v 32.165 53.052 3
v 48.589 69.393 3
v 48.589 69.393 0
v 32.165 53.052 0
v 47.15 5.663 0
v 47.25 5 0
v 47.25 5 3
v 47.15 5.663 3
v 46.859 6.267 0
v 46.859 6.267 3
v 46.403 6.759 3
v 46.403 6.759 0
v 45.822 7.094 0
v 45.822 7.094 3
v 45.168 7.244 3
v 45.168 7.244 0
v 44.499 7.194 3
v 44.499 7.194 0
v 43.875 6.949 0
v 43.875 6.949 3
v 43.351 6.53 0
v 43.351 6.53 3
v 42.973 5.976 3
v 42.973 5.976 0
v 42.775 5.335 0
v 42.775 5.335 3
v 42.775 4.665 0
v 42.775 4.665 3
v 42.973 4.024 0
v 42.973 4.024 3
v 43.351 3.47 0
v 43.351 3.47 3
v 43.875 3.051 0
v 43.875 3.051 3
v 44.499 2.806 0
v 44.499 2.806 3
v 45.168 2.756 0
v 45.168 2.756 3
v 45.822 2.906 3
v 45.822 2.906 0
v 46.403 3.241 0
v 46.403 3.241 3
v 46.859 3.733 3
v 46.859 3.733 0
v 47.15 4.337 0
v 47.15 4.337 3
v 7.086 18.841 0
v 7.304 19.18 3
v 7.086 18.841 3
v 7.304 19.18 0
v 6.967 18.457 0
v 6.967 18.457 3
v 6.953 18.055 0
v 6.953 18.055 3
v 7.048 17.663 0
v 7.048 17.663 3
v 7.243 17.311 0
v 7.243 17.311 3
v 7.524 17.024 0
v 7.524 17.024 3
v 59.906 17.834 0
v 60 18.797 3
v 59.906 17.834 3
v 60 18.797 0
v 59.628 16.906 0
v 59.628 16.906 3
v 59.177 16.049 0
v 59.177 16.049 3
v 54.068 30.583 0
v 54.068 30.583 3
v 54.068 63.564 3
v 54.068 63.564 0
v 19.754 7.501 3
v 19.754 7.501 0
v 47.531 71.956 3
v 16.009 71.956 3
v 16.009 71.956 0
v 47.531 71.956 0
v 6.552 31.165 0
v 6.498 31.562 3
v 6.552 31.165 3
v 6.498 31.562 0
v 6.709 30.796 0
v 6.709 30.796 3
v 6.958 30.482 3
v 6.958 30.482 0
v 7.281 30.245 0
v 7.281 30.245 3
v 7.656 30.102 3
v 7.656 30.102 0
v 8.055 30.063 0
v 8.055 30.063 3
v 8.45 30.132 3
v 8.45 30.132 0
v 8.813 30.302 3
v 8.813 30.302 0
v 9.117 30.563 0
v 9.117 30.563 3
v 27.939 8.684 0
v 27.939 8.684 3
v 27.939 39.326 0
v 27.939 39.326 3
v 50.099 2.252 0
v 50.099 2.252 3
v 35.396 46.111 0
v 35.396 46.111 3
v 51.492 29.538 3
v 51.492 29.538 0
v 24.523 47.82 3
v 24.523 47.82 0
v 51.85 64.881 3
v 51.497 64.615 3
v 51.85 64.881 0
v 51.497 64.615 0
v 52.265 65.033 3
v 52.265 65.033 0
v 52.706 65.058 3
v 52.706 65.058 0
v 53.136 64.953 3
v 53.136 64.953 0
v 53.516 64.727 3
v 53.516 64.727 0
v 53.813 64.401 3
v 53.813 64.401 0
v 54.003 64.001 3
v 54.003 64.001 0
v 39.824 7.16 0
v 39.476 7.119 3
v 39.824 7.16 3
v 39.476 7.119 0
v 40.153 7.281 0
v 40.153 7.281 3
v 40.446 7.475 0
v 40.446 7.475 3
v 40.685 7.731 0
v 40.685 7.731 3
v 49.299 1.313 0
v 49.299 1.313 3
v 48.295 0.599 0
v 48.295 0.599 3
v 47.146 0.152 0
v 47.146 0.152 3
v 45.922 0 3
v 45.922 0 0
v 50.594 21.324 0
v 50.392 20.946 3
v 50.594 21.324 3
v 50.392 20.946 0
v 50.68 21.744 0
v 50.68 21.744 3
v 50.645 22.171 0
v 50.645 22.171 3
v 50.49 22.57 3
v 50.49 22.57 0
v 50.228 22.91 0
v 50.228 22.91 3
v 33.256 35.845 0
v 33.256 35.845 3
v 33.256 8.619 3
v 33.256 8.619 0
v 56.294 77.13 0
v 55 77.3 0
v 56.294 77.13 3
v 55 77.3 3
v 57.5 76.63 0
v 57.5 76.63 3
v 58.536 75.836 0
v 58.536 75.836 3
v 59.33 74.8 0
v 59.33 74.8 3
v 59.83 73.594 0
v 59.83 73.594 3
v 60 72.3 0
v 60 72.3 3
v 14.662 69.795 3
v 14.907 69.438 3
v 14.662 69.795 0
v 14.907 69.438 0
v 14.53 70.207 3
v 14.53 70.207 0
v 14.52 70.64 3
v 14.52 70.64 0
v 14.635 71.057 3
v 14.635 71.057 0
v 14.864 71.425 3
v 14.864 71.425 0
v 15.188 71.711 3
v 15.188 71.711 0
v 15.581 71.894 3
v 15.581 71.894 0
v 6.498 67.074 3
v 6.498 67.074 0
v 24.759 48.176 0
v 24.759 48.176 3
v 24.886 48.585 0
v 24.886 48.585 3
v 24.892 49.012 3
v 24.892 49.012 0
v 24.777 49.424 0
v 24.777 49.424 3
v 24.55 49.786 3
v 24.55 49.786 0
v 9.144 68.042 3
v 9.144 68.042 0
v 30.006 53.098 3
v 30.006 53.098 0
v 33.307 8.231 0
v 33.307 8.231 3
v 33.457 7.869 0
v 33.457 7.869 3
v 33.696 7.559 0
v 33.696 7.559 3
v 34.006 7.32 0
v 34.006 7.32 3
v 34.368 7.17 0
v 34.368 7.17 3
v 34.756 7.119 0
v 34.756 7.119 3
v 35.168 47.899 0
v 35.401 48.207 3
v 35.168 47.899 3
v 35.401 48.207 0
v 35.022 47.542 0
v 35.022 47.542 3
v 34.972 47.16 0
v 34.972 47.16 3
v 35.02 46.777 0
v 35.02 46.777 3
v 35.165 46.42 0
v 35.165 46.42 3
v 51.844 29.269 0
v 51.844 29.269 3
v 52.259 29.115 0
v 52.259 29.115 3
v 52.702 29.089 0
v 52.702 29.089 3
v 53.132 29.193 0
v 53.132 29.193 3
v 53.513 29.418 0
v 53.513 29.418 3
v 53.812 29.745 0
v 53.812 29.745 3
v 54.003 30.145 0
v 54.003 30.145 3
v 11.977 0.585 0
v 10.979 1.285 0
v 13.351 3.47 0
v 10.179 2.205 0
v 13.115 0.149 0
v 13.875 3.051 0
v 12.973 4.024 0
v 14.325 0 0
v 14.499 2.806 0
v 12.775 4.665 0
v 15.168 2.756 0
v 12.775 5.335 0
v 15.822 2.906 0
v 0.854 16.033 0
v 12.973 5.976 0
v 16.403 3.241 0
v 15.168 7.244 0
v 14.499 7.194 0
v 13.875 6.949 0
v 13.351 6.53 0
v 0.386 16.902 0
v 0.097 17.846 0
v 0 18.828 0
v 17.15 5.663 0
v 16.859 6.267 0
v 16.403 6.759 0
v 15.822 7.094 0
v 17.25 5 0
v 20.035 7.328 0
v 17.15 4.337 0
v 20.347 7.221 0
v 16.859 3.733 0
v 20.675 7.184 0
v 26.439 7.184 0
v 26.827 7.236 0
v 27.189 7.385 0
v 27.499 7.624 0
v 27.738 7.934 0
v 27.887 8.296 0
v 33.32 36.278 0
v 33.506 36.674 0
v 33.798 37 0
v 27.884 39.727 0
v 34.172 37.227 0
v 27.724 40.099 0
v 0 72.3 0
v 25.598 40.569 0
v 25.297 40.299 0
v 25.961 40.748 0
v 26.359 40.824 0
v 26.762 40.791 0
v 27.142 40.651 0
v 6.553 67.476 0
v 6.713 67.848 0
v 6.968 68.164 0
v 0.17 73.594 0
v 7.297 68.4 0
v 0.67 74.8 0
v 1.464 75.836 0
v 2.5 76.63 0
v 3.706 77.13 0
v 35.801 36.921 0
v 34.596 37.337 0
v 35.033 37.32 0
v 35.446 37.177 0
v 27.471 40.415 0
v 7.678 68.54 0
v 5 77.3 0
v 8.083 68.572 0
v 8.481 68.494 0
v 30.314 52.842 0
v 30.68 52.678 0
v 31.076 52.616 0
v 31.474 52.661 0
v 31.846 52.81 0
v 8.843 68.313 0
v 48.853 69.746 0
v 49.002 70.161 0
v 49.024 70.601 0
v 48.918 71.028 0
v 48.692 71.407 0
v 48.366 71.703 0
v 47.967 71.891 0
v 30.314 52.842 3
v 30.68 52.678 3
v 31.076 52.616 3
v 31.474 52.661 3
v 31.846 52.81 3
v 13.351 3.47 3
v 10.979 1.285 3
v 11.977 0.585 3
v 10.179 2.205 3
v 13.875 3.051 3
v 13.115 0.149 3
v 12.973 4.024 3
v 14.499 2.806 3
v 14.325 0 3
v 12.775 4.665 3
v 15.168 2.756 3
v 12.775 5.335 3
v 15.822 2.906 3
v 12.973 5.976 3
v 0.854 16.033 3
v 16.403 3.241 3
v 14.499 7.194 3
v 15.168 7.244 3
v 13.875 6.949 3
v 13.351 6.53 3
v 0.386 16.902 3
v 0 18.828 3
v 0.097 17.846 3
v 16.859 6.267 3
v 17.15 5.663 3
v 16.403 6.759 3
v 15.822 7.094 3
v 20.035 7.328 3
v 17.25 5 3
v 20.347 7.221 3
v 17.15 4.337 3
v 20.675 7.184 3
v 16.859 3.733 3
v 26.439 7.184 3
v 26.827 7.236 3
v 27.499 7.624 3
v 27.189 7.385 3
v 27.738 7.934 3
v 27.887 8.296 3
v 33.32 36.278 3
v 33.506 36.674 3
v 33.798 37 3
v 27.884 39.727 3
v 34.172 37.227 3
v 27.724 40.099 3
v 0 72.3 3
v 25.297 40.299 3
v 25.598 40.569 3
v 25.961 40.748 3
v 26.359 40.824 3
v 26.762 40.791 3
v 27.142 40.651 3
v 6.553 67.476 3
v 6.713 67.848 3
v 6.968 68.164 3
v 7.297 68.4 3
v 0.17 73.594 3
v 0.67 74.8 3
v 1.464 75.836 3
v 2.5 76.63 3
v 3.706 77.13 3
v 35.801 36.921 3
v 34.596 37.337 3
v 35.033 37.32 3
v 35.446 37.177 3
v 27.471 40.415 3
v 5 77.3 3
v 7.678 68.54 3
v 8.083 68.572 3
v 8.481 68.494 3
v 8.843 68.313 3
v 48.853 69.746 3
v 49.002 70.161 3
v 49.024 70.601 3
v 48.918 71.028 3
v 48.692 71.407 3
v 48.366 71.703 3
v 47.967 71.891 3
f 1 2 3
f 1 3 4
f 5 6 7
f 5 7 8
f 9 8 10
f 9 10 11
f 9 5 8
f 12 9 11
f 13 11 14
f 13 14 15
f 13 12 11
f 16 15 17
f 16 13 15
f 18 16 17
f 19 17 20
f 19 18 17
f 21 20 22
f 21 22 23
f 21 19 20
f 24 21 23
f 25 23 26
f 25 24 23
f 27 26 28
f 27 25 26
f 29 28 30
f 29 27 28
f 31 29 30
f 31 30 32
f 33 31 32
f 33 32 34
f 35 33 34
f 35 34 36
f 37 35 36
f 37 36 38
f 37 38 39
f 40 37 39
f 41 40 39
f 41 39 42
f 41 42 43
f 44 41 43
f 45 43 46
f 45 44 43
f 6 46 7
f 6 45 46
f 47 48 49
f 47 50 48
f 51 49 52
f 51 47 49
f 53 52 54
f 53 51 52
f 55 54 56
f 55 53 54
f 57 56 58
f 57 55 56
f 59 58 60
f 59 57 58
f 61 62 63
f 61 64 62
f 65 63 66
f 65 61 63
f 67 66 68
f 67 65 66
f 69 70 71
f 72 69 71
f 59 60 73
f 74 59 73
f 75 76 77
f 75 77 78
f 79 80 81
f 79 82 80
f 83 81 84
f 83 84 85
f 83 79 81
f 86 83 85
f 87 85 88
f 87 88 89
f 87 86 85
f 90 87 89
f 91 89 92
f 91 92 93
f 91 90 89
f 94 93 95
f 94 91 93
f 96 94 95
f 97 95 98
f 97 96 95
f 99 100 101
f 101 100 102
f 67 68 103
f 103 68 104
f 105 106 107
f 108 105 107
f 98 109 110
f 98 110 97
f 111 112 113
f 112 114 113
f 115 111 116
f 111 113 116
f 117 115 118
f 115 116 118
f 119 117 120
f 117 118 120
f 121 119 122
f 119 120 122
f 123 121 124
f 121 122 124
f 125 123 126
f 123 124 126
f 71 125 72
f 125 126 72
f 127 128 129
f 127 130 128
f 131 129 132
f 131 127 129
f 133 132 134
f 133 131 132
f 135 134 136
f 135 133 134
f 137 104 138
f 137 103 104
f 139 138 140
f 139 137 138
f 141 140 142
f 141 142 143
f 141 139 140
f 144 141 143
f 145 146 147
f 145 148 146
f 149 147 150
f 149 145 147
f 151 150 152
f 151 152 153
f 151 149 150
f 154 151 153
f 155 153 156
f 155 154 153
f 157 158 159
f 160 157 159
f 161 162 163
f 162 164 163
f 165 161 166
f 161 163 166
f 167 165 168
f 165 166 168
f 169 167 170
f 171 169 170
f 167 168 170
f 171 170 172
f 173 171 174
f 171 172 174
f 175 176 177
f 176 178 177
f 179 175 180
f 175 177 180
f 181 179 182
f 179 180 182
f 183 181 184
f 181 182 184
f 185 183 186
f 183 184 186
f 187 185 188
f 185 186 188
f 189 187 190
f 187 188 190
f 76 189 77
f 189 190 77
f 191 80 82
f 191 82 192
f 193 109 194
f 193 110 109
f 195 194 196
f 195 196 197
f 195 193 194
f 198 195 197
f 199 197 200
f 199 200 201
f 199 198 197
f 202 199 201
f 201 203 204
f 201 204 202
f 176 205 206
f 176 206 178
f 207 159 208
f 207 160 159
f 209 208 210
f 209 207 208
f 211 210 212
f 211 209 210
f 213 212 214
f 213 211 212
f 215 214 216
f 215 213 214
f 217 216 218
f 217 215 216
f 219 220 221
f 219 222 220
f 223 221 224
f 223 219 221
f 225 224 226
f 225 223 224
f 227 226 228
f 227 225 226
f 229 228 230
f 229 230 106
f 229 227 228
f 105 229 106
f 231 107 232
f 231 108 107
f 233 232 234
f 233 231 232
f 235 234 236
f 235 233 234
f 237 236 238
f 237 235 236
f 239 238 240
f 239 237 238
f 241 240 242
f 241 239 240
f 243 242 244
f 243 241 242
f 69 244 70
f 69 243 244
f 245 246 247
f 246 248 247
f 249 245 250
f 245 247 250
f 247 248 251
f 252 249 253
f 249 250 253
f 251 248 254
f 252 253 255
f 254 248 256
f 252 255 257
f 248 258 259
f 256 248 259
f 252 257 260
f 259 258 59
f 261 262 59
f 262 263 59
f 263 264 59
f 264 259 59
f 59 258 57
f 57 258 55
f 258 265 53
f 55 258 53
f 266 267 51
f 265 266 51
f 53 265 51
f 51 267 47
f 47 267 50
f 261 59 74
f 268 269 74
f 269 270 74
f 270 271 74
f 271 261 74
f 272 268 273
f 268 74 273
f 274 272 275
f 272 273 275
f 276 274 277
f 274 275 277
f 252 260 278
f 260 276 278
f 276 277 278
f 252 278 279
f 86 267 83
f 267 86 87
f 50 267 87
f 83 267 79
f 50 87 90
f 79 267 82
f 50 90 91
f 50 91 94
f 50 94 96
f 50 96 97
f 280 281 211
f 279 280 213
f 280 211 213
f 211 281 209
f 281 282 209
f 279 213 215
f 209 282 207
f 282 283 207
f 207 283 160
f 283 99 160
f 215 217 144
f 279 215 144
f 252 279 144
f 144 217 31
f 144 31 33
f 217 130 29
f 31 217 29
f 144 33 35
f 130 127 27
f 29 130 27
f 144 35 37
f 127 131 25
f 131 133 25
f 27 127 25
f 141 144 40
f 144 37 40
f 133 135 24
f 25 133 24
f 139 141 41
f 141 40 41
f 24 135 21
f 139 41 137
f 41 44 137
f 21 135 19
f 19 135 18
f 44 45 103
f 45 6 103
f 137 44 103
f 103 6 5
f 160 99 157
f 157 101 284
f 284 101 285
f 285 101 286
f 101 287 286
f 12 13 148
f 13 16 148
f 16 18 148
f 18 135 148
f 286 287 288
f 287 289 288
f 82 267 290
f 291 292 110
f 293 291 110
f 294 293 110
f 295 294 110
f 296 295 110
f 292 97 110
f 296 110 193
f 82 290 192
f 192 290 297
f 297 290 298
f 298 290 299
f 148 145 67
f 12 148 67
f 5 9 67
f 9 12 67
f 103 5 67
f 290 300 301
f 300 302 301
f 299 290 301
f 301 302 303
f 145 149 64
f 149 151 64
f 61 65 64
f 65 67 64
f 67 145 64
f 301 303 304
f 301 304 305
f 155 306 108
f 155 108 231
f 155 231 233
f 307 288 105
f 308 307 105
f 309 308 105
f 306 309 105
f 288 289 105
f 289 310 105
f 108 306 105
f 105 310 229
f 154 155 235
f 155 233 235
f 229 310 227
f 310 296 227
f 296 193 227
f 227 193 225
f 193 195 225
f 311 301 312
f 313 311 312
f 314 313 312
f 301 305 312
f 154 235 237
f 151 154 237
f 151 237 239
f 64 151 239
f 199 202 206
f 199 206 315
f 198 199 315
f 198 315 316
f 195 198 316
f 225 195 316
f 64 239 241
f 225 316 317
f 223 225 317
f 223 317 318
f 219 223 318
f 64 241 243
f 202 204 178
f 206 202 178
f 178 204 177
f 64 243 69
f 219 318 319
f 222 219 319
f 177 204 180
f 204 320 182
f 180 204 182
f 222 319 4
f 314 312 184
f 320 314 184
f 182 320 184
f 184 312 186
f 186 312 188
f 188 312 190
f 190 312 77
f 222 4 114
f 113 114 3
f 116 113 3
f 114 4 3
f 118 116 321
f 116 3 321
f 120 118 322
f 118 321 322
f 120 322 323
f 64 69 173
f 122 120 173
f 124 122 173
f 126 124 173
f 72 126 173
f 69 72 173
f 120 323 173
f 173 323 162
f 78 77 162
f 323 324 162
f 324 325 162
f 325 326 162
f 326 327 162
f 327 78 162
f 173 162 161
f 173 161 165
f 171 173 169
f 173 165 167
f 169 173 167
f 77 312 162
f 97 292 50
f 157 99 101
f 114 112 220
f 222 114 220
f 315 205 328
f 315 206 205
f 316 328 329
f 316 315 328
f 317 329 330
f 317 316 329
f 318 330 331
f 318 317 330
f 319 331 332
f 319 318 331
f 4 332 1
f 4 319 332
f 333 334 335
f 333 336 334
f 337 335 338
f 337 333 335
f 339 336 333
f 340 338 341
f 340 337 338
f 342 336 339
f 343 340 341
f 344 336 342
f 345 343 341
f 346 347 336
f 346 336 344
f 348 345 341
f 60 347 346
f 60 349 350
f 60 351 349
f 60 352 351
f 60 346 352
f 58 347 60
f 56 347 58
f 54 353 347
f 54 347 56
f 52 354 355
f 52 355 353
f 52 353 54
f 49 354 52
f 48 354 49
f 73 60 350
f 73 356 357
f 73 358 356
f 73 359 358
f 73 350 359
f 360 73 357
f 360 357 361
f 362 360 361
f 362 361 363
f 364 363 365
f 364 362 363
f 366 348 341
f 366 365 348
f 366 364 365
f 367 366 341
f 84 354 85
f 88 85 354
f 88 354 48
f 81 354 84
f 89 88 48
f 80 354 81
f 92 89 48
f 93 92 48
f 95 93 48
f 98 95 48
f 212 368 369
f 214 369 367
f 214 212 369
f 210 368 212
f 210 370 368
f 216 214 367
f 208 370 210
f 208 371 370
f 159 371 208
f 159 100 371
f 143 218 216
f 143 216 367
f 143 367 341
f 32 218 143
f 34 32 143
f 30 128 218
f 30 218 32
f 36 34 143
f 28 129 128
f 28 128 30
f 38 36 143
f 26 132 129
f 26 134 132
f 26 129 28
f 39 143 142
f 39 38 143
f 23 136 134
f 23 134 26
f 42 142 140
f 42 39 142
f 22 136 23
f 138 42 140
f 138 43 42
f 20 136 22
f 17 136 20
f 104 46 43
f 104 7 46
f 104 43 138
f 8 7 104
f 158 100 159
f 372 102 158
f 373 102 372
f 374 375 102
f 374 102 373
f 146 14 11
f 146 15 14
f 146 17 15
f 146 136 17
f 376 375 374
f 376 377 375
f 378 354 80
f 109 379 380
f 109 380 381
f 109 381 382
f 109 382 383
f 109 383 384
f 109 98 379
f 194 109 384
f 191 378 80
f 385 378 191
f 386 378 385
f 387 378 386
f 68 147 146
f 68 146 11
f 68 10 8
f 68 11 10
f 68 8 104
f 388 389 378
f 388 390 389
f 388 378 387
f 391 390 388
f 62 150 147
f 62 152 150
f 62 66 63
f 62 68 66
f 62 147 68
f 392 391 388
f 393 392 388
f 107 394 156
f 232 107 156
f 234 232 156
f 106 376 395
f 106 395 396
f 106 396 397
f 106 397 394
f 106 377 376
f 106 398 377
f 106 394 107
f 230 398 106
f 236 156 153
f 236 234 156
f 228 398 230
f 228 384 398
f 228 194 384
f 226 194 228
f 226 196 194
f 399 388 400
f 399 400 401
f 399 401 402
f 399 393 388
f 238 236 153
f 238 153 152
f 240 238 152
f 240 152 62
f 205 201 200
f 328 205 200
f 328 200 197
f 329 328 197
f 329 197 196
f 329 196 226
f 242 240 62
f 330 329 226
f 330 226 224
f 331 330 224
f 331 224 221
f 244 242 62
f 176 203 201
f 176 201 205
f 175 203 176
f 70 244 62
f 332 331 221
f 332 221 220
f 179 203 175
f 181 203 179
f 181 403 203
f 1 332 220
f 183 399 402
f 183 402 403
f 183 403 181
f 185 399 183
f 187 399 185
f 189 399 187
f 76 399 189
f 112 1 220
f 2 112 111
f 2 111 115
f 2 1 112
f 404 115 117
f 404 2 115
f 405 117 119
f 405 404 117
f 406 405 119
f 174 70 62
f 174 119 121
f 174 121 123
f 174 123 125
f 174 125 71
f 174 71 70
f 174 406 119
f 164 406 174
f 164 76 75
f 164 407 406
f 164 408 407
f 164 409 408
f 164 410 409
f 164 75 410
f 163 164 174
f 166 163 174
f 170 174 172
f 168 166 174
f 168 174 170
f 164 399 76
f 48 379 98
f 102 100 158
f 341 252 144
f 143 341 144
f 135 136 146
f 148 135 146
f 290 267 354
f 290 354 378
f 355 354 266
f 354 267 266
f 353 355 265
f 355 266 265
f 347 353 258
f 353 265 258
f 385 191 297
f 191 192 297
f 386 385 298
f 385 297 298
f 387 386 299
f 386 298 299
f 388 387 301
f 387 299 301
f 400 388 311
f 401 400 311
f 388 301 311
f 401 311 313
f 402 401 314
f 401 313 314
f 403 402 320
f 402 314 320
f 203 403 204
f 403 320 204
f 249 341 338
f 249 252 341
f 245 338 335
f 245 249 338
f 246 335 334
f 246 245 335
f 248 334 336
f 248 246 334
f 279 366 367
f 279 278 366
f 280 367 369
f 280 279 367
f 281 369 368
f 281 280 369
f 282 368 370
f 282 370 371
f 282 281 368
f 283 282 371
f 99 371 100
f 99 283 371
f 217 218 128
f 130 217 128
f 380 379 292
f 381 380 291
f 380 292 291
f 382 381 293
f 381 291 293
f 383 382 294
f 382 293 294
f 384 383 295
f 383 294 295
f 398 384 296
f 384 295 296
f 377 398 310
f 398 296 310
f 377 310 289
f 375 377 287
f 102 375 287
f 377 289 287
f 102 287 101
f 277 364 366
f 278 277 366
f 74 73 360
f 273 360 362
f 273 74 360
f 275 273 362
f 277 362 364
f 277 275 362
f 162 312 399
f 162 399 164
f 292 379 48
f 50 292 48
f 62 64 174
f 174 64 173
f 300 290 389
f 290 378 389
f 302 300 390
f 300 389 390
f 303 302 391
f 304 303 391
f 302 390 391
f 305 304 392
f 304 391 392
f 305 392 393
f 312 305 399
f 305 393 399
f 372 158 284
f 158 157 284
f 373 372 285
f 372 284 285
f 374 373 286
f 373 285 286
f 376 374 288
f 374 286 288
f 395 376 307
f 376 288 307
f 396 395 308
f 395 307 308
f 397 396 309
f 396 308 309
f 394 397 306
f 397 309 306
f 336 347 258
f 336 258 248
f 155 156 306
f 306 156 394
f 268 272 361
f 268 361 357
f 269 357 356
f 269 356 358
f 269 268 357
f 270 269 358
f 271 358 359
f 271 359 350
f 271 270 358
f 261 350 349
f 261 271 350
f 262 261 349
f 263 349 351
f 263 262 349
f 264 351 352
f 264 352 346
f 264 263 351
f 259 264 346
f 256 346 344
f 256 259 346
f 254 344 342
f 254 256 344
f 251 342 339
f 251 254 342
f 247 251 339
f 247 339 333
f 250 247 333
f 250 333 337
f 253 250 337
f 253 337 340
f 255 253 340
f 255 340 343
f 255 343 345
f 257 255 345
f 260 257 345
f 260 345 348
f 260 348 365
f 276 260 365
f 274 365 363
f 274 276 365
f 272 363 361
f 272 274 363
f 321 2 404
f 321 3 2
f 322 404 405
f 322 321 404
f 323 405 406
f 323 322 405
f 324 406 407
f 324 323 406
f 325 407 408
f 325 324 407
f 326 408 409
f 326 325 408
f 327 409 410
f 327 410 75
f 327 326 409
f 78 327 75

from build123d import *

# Parameters (mm, degrees)
SKETCH_1_W          = 60
SKETCH_1_H          = 77.3
SKETCH_1_R          = 2.25
EXTRUDE_1_DEPTH     = 3
CUT_EXTRUDE_1_DEPTH = 98.899387128
FILLET_2_R          = 1.5
FILLET_3_R          = 5


with BuildPart() as part:
    # 草图1 → 凸台-拉伸1 (new body)
    with BuildSketch(Plane.XY):
        with Locations((30, 38.65)):
            Rectangle(SKETCH_1_W, SKETCH_1_H)
        with Locations((15, 5)):
            Circle(SKETCH_1_R, mode=Mode.SUBTRACT)
        with Locations((45, 5)):
            Circle(SKETCH_1_R, mode=Mode.SUBTRACT)
    extrude(amount=EXTRUDE_1_DEPTH)

    # 草图2 → 切除-拉伸1 (cut, through all)
    with BuildSketch(Plane.XY.offset(3)):
        Polygon((6.498142721, 71.177419939), (25.390067515, 48.791389416), (6.498142721, 27.629402774), align=None)
        Polygon((12.580592965, 71.956095933), (51.165829297, 71.956095933), (31.061830901, 51.954660702), align=None)
        Polygon((54.068167093, 67.235159515), (34.375406047, 47.16148119), (54.068167093, 26.885410871), align=None)
        Polygon((27.938555498, 43.399685415), (6.287330924, 17.986665065), (20.160366982, 7.184410962), (27.938555498, 7.184410962), align=None)
        Polygon((33.25628143, 39.393281631), (33.25628143, 7.119255047), (40.235291957, 7.119255047), (51.165829297, 21.999247226), align=None)
        Polygon((0, 17.3), (11.665719773, 0), (0, 0), align=None)
        Polygon((60, 17.3), (48.617435134, 0), (60, 0), align=None)
    extrude(amount=-CUT_EXTRUDE_1_DEPTH, mode=Mode.SUBTRACT)

    # 圆角2
    fillet_2_edges = [part.edges().sort_by_distance(p)[0] for p in [
        (6.498142721, 27.629402774, 1.5),
        (6.498142721, 71.177419939, 1.5),
        (25.390067515, 48.791389416, 1.5),
        (31.061830901, 51.954660702, 1.5),
        (12.580592965, 71.956095933, 1.5),
        (51.165829297, 71.956095933, 1.5),
        (27.938555498, 43.399685415, 1.5),
        (27.938555498, 7.184410962, 1.5),
        (20.160366982, 7.184410962, 1.5),
        (6.287330924, 17.986665065, 1.5),
        (40.235291957, 7.119255047, 1.5),
        (33.25628143, 7.119255047, 1.5),
        (33.25628143, 39.393281631, 1.5),
        (51.165829297, 21.999247226, 1.5),
        (54.068167093, 67.235159515, 1.5),
        (54.068167093, 26.885410871, 1.5),
        (34.375406047, 47.16148119, 1.5),
    ]]
    fillet(fillet_2_edges, radius=FILLET_2_R)

    # 圆角3
    fillet_3_edges = [part.edges().sort_by_distance(p)[0] for p in [
        (0, 17.3, 1.5),
        (11.665719773, 0, 1.5),
        (0, 77.3, 1.5),
        (60, 17.3, 1.5),
        (60, 77.3, 1.5),
        (48.617435134, 0, 1.5),
    ]]
    fillet(fillet_3_edges, radius=FILLET_3_R)


solid = part.part
